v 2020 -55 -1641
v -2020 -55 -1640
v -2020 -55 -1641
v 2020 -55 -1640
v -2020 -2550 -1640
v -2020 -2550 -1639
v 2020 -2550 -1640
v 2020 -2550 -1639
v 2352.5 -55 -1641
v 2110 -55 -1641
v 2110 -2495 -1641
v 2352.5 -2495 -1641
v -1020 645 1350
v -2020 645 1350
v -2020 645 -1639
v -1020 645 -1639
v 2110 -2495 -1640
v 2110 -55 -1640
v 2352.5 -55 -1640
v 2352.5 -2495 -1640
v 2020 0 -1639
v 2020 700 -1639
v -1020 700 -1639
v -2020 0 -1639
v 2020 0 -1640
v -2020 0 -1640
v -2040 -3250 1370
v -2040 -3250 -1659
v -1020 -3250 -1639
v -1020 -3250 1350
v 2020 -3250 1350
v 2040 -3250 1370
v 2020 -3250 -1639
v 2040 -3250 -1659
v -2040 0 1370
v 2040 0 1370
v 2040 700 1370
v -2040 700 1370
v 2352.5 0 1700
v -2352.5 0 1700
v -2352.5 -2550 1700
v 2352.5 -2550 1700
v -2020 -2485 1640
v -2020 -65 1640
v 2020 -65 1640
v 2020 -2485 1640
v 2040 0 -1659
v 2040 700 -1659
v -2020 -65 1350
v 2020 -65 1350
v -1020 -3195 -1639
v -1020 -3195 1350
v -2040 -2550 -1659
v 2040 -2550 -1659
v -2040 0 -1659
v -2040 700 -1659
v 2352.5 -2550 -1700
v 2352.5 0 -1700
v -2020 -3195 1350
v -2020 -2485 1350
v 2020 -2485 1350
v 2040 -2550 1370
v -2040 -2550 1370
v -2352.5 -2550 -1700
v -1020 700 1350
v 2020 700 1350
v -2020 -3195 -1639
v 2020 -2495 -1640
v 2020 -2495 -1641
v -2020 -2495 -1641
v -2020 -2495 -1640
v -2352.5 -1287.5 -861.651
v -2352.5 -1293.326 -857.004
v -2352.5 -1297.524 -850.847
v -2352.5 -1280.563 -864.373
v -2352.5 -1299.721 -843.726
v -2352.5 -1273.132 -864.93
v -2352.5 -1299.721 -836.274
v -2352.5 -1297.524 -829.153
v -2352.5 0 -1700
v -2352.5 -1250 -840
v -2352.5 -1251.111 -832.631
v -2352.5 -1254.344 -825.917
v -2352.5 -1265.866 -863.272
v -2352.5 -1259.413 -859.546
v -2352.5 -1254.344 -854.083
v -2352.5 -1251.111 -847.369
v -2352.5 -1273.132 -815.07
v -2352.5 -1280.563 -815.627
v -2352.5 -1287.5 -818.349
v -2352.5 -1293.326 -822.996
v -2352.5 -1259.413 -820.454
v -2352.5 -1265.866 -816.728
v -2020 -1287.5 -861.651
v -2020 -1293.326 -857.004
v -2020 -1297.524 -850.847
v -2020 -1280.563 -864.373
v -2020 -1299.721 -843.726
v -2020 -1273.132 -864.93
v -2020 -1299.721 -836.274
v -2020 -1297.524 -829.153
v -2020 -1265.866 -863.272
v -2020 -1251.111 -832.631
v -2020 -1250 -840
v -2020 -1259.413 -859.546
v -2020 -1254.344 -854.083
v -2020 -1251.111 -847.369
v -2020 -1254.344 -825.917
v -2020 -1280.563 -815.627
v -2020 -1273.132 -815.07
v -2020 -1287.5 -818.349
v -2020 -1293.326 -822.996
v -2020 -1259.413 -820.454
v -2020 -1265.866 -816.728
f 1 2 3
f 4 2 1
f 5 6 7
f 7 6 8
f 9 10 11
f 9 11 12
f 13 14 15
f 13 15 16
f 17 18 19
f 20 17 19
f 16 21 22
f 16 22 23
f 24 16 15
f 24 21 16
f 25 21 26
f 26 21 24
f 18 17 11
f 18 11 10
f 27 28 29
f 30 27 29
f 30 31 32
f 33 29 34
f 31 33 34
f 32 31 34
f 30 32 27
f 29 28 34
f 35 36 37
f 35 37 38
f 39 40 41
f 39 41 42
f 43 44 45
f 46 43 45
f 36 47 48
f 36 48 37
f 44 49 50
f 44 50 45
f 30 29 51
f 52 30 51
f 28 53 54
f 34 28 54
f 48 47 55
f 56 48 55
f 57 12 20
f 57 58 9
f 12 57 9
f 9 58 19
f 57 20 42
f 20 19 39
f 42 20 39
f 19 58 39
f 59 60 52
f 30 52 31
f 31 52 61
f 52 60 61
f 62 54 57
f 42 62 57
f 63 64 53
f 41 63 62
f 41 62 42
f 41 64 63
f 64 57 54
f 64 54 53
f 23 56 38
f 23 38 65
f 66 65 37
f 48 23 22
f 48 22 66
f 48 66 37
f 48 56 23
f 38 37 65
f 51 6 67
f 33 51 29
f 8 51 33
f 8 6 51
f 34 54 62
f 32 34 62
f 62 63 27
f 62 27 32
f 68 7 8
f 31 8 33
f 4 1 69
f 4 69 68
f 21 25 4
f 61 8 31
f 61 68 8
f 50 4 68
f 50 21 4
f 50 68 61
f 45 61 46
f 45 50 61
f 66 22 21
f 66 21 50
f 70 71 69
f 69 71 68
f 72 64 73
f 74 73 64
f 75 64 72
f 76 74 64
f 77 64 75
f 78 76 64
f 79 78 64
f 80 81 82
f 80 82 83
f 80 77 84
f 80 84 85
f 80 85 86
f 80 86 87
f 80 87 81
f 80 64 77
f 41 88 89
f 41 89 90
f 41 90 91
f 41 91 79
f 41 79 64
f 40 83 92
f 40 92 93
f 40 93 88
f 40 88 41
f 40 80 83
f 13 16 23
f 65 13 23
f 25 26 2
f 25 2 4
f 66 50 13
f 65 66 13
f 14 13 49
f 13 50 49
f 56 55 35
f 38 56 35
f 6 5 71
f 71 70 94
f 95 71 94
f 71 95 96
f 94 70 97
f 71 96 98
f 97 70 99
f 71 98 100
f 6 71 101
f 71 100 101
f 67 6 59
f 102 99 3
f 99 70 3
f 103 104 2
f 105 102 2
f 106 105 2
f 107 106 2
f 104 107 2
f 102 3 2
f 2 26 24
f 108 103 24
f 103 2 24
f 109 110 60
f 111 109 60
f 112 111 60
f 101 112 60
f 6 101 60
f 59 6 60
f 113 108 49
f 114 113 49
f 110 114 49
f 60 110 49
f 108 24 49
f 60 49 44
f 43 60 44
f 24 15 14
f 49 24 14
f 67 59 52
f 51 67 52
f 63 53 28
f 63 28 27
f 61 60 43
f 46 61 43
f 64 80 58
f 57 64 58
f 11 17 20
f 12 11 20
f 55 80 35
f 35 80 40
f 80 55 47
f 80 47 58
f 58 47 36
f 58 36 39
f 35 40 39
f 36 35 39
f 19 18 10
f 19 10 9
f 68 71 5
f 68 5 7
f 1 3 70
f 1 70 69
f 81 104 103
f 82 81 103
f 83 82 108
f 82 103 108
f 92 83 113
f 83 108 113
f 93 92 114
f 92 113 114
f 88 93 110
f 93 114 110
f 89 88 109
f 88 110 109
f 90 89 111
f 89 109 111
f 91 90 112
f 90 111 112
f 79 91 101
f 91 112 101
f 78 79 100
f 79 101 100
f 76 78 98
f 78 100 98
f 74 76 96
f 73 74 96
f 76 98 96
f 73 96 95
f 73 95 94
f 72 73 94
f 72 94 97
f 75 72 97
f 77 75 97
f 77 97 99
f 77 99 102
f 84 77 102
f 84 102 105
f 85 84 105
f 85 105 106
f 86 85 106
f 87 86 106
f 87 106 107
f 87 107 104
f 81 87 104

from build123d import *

# Parameters (mm, degrees)
F0_W      = 4705
F0_H      = 3400
F0_W_2    = 4040
F0_H_2    = 3280
F1_DEPTH  = 2550
F2_W      = 65
F2_H      = 290
F3_DEPTH  = 4040
F4_R      = 25
F5_DEPTH  = 332.501
F6_W      = 242.5
F6_H      = 2440
F7_DEPTH  = 1
F8_W      = 4080
F8_H      = 3029
F8_W_2    = 4040
F8_H_2    = 2989
F9_DEPTH  = 700
F10_W     = 4080
F10_H     = 3029
F10_W_2   = 4040
F10_H_2   = 2989
F11_DEPTH = 700
F12_W     = 1000
F12_H     = 55
F13_DEPTH = 2989
F14_W     = 1000
F14_H     = 55
F15_DEPTH = 2989
F16_W     = 4040
F16_H     = 2440
F17_DEPTH = 1


with BuildPart() as f1:
    # F0 (on Front) → F1 (new body)
    with BuildSketch(Plane.XZ):
        Rectangle(F0_W, F0_H)
        Rectangle(F0_W_2, F0_H_2, mode=Mode.SUBTRACT)
    extrude(amount=F1_DEPTH)

    # F2 (on face) → F3 (join, through all)
    with BuildSketch(Plane.YZ.offset(-2020)):
        with Locations((-2517.5, 1495)):
            Rectangle(F2_W, F2_H)
        with Locations((-32.5, 1495)):
            Rectangle(F2_W, F2_H)
    extrude(amount=F3_DEPTH)

    # F4 (on face) → F5 (cut, through all)
    with BuildSketch(Plane.YZ.offset(-2020)):
        with Locations((-1275, -840)):
            Circle(F4_R)
    extrude(amount=-F5_DEPTH, mode=Mode.SUBTRACT)

    # F6 (on face) → F7 (cut)
    with BuildSketch(Plane.XY.offset(-1640)):
        with Locations((2231.25, -1275)):
            Rectangle(F6_W, F6_H)
    extrude(amount=-F7_DEPTH, mode=Mode.SUBTRACT)

    # F8 (on face) → F9 (join)
    with BuildSketch(Plane(origin=(0, 0, 0), x_dir=(-1, 0, 0), z_dir=(0, 1, 0))):
        with Locations((0, -144.5)):
            Rectangle(F8_W, F8_H)
        with Locations((0, -144.5)):
            Rectangle(F8_W_2, F8_H_2, mode=Mode.SUBTRACT)
    extrude(amount=F9_DEPTH)

    # F10 (on face) → F11 (join)
    with BuildSketch(Plane.XZ.offset(2550)):
        with Locations((0, -144.5)):
            Rectangle(F10_W, F10_H)
        with Locations((0, -144.5)):
            Rectangle(F10_W_2, F10_H_2, mode=Mode.SUBTRACT)
    extrude(amount=F11_DEPTH)

    # F12 (on face) → F13 (join, through all)
    with BuildSketch(Plane.XY.offset(-1639)):
        with Locations((-1520, 672.5)):
            Rectangle(F12_W, F12_H)
    extrude(amount=F13_DEPTH)

    # F14 (on face) → F15 (join, through all)
    with BuildSketch(Plane.XY.offset(-1639)):
        with Locations((-1520, -3222.5)):
            Rectangle(F14_W, F14_H)
    extrude(amount=F15_DEPTH)

    # F16 (on face) → F17 (cut)
    with BuildSketch(Plane.XY.offset(-1640)):
        with Locations((0, -1275)):
            Rectangle(F16_W, F16_H)
    extrude(amount=-F17_DEPTH, mode=Mode.SUBTRACT)


solid = f1.part
